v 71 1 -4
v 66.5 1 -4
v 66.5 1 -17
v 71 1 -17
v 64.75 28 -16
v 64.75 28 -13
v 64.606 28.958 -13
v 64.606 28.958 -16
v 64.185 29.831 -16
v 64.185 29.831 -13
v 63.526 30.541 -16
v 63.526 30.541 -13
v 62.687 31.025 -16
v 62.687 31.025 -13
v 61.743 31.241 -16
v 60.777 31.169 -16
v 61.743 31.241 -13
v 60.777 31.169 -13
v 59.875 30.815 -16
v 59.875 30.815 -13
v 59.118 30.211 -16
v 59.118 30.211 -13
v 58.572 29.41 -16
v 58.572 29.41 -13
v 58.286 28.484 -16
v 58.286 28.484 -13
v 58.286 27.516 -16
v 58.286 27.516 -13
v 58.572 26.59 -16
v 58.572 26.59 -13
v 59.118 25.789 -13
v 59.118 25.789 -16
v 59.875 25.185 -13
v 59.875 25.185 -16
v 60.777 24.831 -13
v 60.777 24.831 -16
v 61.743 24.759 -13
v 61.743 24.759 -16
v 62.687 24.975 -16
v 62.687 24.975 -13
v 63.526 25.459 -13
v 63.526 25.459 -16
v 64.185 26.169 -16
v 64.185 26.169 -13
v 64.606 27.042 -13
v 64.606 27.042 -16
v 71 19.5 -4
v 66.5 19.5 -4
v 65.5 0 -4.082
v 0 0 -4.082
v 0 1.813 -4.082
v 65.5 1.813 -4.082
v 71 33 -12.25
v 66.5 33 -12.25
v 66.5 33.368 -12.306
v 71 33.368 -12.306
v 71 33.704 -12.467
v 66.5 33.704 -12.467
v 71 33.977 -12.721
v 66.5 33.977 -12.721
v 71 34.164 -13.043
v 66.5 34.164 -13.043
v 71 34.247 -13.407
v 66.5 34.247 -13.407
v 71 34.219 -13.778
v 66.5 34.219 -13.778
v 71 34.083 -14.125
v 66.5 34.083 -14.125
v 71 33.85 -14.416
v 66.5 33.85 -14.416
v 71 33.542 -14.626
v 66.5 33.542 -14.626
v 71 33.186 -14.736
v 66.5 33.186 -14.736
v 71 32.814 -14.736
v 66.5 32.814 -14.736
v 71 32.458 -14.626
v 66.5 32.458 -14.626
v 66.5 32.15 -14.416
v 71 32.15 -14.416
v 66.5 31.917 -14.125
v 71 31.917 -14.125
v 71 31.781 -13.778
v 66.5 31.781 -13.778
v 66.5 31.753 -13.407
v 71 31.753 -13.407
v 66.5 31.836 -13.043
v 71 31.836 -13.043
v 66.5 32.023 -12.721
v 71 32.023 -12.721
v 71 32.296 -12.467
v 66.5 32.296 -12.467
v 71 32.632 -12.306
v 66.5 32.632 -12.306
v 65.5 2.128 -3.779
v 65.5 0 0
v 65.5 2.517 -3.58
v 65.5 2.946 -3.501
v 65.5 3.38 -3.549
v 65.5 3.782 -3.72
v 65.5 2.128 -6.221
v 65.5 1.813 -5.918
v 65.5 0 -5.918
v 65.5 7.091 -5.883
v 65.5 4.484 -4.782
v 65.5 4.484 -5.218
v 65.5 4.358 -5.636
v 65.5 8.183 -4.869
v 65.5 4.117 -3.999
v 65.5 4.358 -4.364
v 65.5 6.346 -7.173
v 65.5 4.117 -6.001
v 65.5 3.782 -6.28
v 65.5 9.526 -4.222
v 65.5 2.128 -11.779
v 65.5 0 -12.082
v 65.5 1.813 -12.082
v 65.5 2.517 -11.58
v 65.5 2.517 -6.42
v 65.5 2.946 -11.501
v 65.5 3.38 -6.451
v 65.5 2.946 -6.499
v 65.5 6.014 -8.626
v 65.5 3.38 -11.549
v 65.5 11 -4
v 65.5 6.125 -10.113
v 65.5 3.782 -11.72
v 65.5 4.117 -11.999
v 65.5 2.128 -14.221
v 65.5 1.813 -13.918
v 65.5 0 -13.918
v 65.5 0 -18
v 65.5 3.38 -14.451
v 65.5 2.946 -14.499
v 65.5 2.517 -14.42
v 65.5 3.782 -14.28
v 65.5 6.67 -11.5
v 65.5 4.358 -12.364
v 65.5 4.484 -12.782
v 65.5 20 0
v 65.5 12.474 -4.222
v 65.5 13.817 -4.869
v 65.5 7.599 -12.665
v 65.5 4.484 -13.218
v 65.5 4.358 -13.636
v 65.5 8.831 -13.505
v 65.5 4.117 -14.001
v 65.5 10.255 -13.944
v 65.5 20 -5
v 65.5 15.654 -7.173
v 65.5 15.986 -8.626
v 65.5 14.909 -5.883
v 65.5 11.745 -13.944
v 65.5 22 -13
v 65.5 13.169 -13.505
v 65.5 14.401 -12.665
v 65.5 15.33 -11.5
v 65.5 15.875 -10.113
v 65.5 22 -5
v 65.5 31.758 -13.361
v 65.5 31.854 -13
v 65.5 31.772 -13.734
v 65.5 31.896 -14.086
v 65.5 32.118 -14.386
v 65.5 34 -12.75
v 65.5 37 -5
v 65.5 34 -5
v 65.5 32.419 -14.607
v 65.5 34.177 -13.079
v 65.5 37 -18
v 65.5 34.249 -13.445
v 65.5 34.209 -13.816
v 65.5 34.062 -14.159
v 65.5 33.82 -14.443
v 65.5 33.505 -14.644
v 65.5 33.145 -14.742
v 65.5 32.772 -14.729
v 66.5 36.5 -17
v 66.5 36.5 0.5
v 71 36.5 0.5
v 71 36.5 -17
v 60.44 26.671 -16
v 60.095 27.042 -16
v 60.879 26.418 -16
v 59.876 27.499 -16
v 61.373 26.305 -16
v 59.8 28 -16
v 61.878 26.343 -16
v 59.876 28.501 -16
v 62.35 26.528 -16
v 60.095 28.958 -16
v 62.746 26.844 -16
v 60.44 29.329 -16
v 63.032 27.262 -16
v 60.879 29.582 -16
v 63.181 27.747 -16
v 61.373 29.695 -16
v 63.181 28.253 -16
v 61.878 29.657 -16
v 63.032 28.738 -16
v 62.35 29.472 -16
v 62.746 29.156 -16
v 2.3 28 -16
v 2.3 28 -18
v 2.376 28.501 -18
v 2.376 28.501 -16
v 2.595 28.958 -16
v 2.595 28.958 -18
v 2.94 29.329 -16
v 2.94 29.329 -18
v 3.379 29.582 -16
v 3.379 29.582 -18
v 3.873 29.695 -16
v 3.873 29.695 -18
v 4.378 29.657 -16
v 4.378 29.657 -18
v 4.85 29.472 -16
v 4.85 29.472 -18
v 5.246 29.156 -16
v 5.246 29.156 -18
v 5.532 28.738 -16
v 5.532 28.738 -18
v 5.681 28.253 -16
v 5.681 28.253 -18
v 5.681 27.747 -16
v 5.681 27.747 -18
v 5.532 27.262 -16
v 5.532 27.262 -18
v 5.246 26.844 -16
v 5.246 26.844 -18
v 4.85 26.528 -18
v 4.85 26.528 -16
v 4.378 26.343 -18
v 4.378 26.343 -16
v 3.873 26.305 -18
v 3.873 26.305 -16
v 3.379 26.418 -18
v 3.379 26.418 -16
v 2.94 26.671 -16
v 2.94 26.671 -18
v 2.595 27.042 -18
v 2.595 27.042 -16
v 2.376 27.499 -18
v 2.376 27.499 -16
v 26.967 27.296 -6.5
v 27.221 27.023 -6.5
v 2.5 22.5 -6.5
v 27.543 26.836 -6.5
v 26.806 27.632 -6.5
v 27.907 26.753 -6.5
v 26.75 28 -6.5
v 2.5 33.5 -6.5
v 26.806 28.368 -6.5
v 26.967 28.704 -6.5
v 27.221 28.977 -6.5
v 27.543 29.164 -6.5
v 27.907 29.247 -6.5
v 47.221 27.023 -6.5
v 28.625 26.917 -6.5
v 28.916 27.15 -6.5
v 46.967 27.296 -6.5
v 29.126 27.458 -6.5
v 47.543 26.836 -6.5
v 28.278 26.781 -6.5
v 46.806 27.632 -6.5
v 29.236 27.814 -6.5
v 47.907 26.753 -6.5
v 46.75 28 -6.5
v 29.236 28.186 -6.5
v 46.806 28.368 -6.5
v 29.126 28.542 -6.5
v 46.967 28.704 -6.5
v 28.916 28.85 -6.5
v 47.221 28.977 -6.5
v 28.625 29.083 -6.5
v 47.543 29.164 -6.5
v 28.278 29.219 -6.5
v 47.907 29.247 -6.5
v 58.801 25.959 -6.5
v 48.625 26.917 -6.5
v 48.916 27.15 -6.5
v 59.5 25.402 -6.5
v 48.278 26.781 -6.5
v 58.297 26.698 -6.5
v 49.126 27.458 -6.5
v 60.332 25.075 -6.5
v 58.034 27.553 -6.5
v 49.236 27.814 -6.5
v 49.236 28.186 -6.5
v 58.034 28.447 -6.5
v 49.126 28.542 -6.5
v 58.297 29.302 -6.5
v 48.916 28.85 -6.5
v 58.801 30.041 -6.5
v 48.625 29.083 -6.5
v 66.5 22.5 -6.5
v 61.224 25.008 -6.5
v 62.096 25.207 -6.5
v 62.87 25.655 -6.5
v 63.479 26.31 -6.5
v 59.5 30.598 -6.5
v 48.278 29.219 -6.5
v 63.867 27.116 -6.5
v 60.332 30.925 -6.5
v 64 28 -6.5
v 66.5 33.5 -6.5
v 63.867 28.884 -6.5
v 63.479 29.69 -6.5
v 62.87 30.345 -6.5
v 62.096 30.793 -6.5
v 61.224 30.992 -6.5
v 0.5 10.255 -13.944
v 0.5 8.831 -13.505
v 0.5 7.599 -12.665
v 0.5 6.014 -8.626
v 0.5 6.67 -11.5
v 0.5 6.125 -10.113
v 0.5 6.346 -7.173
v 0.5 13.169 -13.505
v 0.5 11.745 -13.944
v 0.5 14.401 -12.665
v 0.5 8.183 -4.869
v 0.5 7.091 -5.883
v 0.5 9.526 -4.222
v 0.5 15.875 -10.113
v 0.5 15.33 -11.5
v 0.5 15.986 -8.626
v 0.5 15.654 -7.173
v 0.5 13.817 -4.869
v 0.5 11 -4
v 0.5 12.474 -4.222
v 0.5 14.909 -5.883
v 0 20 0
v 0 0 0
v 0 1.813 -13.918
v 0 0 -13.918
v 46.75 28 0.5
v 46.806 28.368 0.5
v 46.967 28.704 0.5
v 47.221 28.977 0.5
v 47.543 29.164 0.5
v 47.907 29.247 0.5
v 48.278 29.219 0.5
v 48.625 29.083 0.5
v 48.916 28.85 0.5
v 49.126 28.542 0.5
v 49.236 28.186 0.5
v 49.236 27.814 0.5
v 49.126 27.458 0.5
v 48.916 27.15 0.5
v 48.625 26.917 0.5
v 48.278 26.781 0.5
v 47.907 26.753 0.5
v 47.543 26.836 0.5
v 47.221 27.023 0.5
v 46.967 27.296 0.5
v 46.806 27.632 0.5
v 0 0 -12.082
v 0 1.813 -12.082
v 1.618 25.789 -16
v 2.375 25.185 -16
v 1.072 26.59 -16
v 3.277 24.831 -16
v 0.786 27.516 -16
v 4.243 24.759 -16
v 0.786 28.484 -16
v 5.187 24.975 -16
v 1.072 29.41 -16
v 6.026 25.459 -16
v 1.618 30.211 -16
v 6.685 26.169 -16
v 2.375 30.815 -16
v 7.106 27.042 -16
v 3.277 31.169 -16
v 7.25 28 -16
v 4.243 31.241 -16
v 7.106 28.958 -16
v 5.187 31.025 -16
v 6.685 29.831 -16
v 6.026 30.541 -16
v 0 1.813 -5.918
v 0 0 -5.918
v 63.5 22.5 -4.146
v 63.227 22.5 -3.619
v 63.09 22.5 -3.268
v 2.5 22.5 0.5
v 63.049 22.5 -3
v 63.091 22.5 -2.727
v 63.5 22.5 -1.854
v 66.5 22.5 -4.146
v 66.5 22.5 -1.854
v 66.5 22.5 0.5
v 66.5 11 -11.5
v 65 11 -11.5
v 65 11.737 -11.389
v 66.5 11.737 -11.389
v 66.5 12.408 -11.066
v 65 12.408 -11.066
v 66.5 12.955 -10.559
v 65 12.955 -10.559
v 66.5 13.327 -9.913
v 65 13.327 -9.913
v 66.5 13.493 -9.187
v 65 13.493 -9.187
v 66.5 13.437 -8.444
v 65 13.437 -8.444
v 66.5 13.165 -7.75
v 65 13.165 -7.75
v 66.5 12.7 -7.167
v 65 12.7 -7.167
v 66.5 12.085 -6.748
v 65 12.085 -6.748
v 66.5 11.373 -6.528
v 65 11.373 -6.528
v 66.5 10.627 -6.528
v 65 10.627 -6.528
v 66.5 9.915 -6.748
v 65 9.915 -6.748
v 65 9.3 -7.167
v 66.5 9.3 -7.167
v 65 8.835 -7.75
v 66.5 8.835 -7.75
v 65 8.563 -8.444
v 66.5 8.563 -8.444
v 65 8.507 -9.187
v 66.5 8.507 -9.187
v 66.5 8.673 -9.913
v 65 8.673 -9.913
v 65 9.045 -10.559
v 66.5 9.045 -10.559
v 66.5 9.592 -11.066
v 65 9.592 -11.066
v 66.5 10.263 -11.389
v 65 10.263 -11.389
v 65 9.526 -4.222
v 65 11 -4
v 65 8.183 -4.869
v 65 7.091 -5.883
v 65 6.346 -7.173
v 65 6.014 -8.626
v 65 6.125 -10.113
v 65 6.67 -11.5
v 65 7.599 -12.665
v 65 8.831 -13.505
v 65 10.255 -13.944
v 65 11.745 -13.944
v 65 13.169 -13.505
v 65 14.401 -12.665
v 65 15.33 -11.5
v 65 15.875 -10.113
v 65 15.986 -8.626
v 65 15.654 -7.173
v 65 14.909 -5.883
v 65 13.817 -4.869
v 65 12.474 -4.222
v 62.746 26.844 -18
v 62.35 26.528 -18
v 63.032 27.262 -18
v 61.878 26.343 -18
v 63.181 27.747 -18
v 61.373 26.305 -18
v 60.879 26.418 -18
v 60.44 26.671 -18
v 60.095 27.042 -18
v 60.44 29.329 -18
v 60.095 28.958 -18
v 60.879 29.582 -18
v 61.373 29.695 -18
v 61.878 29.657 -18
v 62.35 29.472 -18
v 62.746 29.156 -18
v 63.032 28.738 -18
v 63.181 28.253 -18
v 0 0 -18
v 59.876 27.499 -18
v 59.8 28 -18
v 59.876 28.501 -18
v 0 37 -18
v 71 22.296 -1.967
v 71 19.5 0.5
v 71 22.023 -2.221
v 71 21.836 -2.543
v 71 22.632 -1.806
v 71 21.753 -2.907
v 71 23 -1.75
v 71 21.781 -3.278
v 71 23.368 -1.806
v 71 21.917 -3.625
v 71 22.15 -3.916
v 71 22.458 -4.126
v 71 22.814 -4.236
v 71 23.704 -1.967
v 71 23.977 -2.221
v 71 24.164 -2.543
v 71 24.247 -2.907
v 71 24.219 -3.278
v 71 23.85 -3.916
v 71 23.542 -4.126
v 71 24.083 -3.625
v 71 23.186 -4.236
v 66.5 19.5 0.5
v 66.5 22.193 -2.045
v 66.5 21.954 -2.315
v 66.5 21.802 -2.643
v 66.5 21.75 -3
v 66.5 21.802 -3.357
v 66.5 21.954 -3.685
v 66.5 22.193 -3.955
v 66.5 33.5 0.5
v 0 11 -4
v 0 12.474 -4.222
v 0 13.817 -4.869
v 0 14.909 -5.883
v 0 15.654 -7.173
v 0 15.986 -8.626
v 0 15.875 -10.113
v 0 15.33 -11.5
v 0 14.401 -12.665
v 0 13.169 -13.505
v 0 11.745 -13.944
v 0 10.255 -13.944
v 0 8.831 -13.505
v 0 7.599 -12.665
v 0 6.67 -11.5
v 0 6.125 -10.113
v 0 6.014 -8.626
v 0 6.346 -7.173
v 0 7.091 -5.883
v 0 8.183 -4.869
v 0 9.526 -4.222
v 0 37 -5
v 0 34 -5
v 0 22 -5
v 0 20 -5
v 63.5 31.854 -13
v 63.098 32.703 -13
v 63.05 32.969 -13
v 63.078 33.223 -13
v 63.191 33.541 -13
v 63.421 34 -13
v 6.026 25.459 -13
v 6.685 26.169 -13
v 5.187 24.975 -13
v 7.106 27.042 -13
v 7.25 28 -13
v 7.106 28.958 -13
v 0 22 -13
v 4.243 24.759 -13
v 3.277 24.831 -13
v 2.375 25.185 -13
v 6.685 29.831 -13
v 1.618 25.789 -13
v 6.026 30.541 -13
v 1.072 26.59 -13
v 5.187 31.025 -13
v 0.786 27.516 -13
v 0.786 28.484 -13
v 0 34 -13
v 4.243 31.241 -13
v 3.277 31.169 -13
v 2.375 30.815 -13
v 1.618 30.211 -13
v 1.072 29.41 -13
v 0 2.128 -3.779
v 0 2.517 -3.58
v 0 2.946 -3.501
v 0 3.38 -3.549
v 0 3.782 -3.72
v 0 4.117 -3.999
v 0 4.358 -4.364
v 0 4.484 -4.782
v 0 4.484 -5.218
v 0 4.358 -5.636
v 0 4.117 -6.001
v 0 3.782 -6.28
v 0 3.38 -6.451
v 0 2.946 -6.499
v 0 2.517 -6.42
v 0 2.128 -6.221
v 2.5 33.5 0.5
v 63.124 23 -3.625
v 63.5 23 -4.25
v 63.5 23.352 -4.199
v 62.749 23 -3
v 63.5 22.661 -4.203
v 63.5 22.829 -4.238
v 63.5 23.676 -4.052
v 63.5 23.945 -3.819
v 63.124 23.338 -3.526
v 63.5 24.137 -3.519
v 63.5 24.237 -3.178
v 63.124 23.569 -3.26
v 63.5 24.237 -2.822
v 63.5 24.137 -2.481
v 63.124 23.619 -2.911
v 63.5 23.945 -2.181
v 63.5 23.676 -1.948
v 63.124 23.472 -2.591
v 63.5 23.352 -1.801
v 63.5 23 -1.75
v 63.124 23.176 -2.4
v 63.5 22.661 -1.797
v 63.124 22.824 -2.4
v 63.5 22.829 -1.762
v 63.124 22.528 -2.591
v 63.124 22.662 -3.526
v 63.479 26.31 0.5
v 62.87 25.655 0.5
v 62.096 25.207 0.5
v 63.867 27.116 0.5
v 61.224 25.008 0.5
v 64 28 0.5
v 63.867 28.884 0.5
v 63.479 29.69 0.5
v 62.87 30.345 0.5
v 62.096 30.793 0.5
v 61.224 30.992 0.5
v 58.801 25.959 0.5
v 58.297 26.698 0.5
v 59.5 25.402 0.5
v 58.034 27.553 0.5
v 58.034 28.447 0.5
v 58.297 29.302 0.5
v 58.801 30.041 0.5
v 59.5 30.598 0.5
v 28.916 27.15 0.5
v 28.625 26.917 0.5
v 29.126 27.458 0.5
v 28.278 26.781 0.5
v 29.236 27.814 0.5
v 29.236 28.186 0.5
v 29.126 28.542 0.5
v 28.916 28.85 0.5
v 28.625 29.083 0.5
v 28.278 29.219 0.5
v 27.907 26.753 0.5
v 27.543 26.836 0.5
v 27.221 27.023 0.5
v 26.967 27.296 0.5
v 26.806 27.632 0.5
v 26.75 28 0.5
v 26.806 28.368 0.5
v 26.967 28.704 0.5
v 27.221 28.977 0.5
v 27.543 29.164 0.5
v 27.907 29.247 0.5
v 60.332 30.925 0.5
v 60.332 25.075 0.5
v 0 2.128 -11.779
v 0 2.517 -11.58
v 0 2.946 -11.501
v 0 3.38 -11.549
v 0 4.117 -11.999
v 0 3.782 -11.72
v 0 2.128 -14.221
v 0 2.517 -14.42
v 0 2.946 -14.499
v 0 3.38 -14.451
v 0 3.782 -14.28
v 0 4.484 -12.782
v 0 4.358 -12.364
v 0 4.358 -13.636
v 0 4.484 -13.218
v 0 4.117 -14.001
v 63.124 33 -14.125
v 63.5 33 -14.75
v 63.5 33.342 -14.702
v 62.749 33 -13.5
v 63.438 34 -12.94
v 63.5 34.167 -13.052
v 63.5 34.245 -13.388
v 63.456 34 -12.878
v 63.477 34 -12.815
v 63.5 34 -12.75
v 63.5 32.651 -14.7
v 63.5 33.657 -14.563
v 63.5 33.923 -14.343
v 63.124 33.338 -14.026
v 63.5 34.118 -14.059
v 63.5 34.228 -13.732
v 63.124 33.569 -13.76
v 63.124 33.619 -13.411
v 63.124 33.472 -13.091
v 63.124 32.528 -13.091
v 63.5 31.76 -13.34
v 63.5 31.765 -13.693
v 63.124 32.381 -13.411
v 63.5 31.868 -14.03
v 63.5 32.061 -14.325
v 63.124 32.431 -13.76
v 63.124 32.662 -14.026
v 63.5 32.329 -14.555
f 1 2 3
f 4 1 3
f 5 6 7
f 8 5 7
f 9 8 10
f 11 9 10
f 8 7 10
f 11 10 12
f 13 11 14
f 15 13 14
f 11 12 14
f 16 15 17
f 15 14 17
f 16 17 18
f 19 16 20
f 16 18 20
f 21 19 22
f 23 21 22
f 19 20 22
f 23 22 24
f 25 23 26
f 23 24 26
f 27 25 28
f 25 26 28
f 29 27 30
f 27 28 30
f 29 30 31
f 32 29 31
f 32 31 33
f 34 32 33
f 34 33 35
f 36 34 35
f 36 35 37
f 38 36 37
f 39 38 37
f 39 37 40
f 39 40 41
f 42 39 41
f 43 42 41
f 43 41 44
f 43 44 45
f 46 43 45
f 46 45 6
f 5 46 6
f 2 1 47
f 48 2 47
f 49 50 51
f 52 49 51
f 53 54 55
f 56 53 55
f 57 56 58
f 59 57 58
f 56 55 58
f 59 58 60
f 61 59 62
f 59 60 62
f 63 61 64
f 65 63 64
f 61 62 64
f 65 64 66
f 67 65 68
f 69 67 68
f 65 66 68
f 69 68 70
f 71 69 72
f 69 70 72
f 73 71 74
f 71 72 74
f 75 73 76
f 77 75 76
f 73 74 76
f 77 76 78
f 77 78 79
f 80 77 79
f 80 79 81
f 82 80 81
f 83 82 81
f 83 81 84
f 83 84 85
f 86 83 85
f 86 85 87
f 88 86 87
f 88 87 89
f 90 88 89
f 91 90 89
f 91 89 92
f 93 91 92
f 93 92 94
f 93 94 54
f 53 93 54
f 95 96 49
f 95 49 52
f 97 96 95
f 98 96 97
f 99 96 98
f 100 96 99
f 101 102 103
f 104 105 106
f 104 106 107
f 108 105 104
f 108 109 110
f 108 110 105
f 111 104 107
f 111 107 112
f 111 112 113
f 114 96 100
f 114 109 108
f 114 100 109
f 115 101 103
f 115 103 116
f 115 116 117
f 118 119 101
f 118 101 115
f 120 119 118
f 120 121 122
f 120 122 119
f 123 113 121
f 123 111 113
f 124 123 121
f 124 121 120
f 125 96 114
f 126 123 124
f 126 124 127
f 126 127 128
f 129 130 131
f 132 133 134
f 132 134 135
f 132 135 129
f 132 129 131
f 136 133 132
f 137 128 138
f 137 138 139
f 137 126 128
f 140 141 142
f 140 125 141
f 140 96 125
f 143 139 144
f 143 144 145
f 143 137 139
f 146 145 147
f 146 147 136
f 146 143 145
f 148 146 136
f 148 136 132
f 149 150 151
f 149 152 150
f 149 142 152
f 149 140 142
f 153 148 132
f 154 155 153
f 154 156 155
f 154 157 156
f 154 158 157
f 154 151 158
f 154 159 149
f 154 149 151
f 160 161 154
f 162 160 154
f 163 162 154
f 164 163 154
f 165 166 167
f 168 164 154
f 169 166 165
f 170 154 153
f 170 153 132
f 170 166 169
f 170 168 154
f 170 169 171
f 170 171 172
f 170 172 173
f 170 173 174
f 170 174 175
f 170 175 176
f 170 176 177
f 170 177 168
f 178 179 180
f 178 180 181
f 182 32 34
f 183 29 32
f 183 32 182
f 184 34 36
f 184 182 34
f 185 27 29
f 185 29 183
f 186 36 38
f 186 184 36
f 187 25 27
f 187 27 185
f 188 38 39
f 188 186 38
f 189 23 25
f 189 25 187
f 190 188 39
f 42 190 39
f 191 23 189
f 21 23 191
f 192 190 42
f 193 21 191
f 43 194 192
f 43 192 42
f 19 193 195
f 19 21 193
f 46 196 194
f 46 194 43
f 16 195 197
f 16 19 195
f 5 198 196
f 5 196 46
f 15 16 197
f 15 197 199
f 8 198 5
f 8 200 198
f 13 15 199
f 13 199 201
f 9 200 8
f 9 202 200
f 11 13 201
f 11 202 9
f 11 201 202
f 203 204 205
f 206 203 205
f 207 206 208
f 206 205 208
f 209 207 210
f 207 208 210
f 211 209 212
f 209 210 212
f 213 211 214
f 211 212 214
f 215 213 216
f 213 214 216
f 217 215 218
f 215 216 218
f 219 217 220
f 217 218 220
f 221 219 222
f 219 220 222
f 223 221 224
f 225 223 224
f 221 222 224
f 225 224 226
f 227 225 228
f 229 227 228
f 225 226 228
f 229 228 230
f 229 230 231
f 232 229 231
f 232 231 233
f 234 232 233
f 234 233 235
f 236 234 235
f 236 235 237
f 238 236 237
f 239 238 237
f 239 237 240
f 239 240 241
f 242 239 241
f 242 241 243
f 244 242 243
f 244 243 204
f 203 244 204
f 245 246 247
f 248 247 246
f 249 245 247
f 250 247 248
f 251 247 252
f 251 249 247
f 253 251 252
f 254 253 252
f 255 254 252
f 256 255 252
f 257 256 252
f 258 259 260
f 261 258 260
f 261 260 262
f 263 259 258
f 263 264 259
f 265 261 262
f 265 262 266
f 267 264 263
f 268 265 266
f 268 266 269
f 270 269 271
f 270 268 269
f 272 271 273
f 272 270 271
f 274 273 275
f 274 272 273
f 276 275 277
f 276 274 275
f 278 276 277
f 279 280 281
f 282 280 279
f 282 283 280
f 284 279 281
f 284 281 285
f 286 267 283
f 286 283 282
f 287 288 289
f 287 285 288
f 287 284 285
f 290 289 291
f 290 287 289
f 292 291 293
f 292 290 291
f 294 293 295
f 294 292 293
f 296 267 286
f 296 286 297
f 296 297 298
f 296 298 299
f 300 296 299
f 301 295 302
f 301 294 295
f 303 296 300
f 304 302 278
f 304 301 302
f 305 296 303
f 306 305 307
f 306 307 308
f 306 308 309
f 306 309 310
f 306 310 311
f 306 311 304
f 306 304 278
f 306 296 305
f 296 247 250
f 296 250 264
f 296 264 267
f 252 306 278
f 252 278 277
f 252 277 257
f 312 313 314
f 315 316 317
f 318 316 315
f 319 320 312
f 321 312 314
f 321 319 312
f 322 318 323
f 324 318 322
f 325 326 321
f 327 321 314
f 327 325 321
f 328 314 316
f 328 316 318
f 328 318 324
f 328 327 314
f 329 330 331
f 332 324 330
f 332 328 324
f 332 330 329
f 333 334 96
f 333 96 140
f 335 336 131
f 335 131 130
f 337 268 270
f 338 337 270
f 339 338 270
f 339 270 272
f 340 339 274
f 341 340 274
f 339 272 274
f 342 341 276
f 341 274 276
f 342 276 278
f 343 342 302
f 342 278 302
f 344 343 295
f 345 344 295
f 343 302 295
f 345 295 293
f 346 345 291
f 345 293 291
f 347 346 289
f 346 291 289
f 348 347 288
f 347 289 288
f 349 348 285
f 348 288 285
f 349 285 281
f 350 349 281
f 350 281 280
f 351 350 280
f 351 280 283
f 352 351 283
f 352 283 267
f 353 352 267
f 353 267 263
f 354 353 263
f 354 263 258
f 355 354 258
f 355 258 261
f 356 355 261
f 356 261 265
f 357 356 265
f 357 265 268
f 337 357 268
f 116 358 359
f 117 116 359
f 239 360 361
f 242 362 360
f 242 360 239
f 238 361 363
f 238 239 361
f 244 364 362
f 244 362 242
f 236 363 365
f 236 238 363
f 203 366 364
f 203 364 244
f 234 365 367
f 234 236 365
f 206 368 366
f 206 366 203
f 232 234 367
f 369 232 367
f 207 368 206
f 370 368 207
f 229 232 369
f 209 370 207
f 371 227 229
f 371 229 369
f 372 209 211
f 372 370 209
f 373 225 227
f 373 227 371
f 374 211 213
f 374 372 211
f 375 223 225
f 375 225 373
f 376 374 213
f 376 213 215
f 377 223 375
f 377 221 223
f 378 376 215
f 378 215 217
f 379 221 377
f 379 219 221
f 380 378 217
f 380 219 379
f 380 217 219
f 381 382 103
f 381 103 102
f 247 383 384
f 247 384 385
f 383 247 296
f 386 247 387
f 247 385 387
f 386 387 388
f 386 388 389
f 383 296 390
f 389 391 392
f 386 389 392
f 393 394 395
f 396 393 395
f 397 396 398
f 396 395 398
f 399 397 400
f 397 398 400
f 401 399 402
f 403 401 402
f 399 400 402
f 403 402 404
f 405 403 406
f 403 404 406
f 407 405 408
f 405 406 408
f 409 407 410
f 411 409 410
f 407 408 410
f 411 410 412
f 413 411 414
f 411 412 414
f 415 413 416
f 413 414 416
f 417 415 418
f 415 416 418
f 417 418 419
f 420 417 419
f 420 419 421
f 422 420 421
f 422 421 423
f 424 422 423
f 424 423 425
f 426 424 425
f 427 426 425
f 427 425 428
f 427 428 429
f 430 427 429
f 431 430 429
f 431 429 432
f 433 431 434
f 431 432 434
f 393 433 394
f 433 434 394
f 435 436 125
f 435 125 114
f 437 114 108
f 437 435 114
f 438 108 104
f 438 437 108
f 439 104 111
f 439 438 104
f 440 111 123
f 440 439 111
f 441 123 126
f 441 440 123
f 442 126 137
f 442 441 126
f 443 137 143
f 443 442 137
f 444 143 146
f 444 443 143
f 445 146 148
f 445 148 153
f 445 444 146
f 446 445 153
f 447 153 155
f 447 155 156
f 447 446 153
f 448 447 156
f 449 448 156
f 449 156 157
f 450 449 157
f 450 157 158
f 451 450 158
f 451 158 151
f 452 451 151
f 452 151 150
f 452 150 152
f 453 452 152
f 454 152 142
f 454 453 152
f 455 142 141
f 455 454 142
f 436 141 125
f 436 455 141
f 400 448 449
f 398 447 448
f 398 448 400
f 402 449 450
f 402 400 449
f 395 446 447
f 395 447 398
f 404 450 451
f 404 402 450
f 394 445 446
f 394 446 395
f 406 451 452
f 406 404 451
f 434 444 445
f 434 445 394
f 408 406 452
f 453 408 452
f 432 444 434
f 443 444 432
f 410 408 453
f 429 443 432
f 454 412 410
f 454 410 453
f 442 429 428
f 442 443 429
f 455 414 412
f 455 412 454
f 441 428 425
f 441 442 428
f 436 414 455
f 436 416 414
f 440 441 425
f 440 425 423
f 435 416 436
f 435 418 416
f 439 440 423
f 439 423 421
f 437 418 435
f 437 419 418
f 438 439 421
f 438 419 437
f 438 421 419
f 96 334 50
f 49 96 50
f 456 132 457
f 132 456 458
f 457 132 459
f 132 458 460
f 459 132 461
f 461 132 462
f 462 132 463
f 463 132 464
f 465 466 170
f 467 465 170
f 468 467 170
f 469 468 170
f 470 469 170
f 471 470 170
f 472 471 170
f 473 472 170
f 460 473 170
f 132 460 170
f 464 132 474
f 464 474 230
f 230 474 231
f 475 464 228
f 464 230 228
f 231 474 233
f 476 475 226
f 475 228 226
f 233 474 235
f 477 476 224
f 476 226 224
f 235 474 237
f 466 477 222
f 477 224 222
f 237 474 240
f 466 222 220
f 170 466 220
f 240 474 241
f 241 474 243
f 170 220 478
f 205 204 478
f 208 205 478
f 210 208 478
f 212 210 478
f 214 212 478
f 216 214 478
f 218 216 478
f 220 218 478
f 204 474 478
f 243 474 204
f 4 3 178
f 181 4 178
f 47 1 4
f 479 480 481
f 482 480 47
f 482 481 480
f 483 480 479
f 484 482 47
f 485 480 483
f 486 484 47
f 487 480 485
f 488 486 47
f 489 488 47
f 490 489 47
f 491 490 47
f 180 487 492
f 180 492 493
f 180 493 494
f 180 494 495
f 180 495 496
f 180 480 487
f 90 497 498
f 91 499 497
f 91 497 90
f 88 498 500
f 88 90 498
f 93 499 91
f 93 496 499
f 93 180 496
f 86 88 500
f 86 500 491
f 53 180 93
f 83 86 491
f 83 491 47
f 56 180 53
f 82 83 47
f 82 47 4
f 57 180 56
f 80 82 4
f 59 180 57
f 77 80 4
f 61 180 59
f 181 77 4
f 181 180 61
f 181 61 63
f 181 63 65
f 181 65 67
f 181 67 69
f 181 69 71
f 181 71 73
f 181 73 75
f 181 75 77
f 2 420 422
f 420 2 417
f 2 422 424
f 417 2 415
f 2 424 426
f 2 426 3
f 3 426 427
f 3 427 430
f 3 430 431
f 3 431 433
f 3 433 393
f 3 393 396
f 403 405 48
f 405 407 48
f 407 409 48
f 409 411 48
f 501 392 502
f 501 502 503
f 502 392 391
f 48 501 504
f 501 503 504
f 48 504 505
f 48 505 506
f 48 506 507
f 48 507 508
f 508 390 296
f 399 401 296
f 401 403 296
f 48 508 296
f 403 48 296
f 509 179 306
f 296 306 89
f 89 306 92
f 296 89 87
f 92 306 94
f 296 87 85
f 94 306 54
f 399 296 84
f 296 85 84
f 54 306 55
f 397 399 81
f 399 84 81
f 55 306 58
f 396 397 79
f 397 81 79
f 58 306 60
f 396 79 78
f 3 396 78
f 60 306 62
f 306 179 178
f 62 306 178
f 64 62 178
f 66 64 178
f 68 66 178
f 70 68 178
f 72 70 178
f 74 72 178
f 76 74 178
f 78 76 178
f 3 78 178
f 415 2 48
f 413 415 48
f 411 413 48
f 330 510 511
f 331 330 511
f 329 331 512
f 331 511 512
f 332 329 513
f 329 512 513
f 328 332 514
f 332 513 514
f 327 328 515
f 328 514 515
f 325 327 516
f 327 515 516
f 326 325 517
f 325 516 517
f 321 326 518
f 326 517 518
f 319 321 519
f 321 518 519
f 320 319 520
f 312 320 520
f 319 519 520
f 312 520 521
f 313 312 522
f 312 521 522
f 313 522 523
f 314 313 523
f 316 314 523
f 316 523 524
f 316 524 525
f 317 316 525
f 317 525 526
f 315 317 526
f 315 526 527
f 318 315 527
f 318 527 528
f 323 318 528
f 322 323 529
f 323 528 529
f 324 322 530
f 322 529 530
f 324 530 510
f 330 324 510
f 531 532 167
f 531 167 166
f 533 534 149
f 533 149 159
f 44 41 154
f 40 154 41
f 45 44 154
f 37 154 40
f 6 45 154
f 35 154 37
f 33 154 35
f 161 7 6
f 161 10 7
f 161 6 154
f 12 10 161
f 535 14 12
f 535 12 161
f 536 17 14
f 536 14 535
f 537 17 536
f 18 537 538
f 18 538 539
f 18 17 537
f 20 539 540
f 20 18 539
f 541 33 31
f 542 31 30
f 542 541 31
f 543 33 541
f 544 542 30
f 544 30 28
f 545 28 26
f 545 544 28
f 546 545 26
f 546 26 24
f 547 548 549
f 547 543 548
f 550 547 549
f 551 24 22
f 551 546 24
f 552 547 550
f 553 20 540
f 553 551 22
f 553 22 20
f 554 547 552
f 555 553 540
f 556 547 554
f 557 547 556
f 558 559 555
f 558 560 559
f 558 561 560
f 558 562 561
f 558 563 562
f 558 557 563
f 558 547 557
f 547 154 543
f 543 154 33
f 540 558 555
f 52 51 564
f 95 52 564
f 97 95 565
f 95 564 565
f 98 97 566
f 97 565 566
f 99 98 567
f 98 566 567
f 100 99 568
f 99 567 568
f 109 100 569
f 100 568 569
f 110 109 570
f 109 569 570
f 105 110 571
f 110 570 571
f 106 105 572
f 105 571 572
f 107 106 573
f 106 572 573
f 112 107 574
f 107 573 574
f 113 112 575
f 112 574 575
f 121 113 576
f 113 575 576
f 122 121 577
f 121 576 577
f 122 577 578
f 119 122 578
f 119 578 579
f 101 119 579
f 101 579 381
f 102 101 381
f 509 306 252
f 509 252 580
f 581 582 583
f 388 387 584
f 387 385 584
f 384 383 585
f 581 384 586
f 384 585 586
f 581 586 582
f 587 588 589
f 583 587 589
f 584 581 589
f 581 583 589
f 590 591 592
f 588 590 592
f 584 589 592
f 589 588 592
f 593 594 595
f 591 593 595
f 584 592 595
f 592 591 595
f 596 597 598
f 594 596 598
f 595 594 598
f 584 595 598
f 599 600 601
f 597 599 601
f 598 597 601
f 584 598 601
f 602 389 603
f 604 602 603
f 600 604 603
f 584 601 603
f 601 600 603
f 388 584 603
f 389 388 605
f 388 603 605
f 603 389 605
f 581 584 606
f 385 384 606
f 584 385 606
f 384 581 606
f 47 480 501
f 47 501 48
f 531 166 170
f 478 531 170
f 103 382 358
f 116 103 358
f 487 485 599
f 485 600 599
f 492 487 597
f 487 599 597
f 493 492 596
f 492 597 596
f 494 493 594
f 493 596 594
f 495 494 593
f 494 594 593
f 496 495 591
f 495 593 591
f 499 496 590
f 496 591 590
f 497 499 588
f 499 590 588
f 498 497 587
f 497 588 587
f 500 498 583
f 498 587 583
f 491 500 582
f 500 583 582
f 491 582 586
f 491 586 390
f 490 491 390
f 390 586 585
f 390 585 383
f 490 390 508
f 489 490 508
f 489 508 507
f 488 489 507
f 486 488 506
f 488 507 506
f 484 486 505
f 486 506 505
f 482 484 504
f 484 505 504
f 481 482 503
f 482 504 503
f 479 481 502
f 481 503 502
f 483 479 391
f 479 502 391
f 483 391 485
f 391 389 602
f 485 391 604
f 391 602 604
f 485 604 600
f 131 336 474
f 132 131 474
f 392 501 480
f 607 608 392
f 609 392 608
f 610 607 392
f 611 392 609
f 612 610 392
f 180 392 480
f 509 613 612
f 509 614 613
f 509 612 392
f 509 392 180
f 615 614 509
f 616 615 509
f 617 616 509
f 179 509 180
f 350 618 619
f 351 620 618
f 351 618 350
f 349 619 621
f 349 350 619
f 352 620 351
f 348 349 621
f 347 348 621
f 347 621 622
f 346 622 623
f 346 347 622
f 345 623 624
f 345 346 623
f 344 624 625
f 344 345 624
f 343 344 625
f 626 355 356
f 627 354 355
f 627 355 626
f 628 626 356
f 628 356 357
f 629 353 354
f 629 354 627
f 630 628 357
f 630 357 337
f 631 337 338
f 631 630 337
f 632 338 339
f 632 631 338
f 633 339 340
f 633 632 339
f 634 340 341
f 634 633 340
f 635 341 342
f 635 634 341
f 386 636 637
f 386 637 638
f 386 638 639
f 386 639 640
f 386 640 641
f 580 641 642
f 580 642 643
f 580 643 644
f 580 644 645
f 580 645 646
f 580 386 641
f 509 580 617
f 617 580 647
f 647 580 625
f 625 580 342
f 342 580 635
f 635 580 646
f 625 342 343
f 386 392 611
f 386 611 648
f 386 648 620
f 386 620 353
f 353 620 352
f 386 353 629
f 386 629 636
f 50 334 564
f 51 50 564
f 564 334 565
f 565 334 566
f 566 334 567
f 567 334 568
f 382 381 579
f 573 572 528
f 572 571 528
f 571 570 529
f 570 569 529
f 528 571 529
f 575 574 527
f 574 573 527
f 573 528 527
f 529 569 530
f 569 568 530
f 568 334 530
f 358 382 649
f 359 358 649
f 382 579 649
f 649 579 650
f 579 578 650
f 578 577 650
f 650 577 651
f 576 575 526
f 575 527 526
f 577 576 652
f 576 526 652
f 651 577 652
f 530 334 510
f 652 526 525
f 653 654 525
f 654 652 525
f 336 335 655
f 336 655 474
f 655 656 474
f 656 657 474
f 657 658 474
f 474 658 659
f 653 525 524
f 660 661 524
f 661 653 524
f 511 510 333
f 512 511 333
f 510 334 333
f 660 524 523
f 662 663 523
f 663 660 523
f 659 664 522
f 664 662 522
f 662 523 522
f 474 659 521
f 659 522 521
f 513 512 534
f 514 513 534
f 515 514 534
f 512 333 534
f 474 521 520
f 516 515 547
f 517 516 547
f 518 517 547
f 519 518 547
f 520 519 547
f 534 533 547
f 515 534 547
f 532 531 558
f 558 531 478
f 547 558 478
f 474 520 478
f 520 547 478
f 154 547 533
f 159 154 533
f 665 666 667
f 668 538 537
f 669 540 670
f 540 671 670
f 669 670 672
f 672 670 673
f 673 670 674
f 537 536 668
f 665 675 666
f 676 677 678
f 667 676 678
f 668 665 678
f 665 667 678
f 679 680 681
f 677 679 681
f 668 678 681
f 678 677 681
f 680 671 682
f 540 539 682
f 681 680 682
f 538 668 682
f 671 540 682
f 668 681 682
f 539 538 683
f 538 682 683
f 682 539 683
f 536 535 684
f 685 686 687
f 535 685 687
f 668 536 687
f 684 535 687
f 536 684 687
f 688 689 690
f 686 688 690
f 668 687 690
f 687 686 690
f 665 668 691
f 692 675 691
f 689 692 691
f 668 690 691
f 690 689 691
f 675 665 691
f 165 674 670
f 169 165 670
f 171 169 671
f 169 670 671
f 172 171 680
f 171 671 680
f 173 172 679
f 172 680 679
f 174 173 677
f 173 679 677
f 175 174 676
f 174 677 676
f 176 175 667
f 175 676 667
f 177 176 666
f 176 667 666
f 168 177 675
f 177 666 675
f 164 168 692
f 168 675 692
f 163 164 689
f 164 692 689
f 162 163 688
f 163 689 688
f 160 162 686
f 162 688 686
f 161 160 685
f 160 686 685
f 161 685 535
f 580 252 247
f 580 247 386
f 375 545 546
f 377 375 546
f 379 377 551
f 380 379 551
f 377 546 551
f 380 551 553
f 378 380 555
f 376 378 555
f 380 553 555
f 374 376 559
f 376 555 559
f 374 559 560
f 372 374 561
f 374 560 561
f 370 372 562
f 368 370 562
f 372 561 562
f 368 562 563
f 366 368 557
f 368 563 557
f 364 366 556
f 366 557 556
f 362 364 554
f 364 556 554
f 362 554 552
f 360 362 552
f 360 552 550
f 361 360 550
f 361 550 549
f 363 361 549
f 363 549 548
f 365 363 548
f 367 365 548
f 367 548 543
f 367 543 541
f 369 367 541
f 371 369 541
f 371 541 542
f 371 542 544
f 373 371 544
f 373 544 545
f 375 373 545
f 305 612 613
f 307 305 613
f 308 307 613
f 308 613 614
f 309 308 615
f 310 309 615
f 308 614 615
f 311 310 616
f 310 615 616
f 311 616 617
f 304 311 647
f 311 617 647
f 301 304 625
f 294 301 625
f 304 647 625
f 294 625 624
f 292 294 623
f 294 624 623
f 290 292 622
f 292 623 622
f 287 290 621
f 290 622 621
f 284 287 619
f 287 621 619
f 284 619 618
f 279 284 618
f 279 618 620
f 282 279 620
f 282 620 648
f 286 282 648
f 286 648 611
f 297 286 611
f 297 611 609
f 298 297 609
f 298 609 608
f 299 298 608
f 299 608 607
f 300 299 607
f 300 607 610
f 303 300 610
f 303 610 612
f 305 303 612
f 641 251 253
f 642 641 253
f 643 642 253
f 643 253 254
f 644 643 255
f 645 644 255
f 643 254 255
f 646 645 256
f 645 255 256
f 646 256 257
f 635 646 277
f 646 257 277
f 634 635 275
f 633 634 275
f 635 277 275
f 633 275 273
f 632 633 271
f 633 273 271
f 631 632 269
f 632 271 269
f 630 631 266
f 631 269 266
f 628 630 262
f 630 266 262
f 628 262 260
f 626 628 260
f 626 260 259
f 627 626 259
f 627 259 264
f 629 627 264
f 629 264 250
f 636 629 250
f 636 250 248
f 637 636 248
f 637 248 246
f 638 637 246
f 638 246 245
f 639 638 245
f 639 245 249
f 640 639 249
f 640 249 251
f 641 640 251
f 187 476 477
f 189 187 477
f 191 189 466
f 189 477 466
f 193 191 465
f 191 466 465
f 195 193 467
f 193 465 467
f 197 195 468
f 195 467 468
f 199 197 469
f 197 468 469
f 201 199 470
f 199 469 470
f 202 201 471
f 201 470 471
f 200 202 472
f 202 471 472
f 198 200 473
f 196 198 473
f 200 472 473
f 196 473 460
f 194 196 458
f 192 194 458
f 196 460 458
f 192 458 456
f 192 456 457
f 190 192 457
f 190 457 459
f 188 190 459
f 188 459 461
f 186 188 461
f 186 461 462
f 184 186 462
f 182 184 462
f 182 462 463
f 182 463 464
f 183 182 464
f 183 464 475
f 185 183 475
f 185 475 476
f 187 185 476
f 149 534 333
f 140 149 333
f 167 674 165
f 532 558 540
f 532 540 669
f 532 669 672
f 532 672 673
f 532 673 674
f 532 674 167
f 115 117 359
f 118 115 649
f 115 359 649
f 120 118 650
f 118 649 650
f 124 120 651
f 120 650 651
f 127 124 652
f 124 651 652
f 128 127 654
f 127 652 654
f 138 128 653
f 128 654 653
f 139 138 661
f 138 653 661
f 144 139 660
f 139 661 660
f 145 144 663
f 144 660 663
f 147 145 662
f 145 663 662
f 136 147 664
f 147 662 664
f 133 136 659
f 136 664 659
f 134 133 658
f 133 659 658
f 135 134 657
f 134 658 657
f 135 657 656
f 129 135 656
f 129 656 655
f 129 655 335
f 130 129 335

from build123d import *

# Parameters (mm, degrees)
SKETCH_1_W                     = 18
SKETCH_1_H                     = 37
EXTRUDE_1_DEPTH                = 65.5
SKETCH_2_R                     = 5
CUT_EXTRUDE_1_DEPTH            = 0.5
CUT_EXTRUDE_START              = -0.5
SKETCH_3_R                     = 5
CUT_EXTRUDE_2_DEPTH            = 0.5
SKETCH_4_R                     = 1.5
CUT_EXTRUDE_3_DEPTH            = 78.351470574
SKETCH_5_W                     = 1.835428096
SKETCH_5_H                     = 2.75652024
CUT_EXTRUDE_4_DEPTH            = 78.351470574
SKETCH_6_W                     = 5
SKETCH_6_H                     = 17
CUT_EXTRUDE_5_DEPTH            = 78.351470574
SKETCH_7_W                     = 8
SKETCH_7_H                     = 12
CUT_EXTRUDE_6_DEPTH            = 78.351470574
SKETCH_8_R                     = 2.5
EXTRUDE_2_DEPTH                = 1.5
SKETCH_9_W                     = 17.5
SKETCH_9_H                     = 35.5
EXTRUDE_3_DEPTH                = 4.5
SKETCH_10_W                    = 7
SKETCH_10_H                    = 11
EXTRUDE_4_DEPTH                = 64
CUT_EXTRUDE_7_REACH            = 84.061
SKETCH_11_W                    = 4.5
SKETCH_11_H                    = 18.5
HOLE_WIZARD_M3_1_D             = 2.5
HOLE_WIZARD_M3_1_DEPTH         = 7.5
HOLE_WIZARD_M3_1_TIP           = 0.751075774
HOLE_WIZARD_M3_1_2_D           = 3.4
HOLE_WIZARD_M3_1_2_DEPTH       = 5
HOLE_WIZARD_M3_1_2_CBORE_D     = 6.5
HOLE_WIZARD_M3_1_2_CBORE_DEPTH = 3
CUT_EXTRUDE_8_REACH            = 84.172
SKETCH_16_R                    = 3
HOLE_WIZARD_M3_2_D             = 2.5
HOLE_WIZARD_M3_2_DEPTH         = 7.5
HOLE_WIZARD_M3_2_TIP           = 0.751075774


with BuildPart() as part:
    # 草图1 → 凸台-拉伸1 (new body)
    with BuildSketch(Plane(origin=(0, 0, 0), x_dir=(0, 0, -1), z_dir=(1, 0, 0))):
        with Locations((9, 18.5)):
            Rectangle(SKETCH_1_W, SKETCH_1_H)
    extrude(amount=EXTRUDE_1_DEPTH)

    # 草图2 → 切除-拉伸1 (cut)
    with BuildSketch(Plane.ZY):
        with Locations((-9, 11)):
            Circle(SKETCH_2_R)
    extrude(amount=-CUT_EXTRUDE_1_DEPTH, mode=Mode.SUBTRACT)

    # 草图3 → 切除-拉伸2 (cut)
    with BuildSketch(Plane(origin=(65.5, 0, 0), x_dir=(0, 0, -1), z_dir=(1, 0, 0)).offset(CUT_EXTRUDE_START)):
        with Locations(Location((9, 11, 0), (0, 0, 180))):
            Circle(SKETCH_3_R)
    extrude(amount=CUT_EXTRUDE_2_DEPTH, mode=Mode.SUBTRACT)

    # 草图4 → 切除-拉伸3 (cut, through all)
    with BuildSketch(Plane.ZY):
        with Locations((-13, 3)):
            Circle(SKETCH_4_R)
        with Locations(Location((-5, 3, 0), (0, 0, 180))):
            Circle(SKETCH_4_R)
    extrude(amount=-CUT_EXTRUDE_3_DEPTH, mode=Mode.SUBTRACT)

    # 草图5 → 切除-拉伸4 (cut, through all)
    with BuildSketch(Plane.ZY):
        with Locations((-13, 1.37826012)):
            Rectangle(SKETCH_5_W, SKETCH_5_H)
        with Locations((-5, 1.37826012)):
            Rectangle(SKETCH_5_W, SKETCH_5_H)
    extrude(amount=-CUT_EXTRUDE_4_DEPTH, mode=Mode.SUBTRACT)

    # 草图6 → 切除-拉伸5 (cut, through all)
    with BuildSketch(Plane.ZY):
        with Locations((-2.5, 28.5)):
            Rectangle(SKETCH_6_W, SKETCH_6_H)
    extrude(amount=-CUT_EXTRUDE_5_DEPTH, mode=Mode.SUBTRACT)

    # 草图7 → 切除-拉伸6 (cut, through all)
    with BuildSketch(Plane.ZY):
        with Locations((-9, 28)):
            Rectangle(SKETCH_7_W, SKETCH_7_H)
    extrude(amount=-CUT_EXTRUDE_6_DEPTH, mode=Mode.SUBTRACT)

    # 草图8 → 凸台-拉伸2 (add)
    with BuildSketch(Plane(origin=(65, 0, 0), x_dir=(0, 0, -1), z_dir=(1, 0, 0))):
        with Locations((9, 11)):
            Circle(SKETCH_8_R)
    extrude(amount=EXTRUDE_2_DEPTH)

    # 草图9 → 凸台-拉伸3 (add)
    with BuildSketch(Plane(origin=(66.5, 0, 0), x_dir=(0, 0, -1), z_dir=(1, 0, 0))):
        with Locations((8.25, 18.75)):
            Rectangle(SKETCH_9_W, SKETCH_9_H)
    extrude(amount=EXTRUDE_3_DEPTH)

    # 草图10 → 凸台-拉伸4 (add)
    with BuildSketch(Plane.ZY.offset(-66.5)):
        with Locations((-3, 28)):
            Rectangle(SKETCH_10_W, SKETCH_10_H)
    extrude(amount=EXTRUDE_4_DEPTH)

    # 草图11 → 切除-拉伸7 (cut, up to next)
    with BuildSketch(Plane(origin=(71, 0, 0), x_dir=(0, 0, -1), z_dir=(1, 0, 0)), mode=Mode.PRIVATE) as cut_extrude_7_sk1:
        with Locations((1.75, 10.25)):
            Rectangle(SKETCH_11_W, SKETCH_11_H)
    cut_extrude_7_tool1 = extrude(cut_extrude_7_sk1.sketch, amount=-CUT_EXTRUDE_7_REACH, mode=Mode.PRIVATE) & part.part
    add(cut_extrude_7_tool1.solids().sort_by_distance((71, 10.25, -1.75))[0], mode=Mode.SUBTRACT)

    # Hole Wizard M3 _1
    with Locations(Plane(origin=(71, 0, 0), x_dir=(0, 0, -1), z_dir=(1, 0, 0))):
        with Locations((13.5, 33), (3, 23)):
            Hole(HOLE_WIZARD_M3_1_D / 2, depth=HOLE_WIZARD_M3_1_DEPTH)
            with Locations((0, 0, -(HOLE_WIZARD_M3_1_DEPTH + HOLE_WIZARD_M3_1_TIP / 2))):  # 118° drill point
                Cone(0, HOLE_WIZARD_M3_1_D / 2, HOLE_WIZARD_M3_1_TIP, mode=Mode.SUBTRACT)

    # Hole Wizard M3 _1 2
    with Locations(Plane.XY.offset(-13)):
        with Locations((4, 28), (61.5, 28)):
            CounterBoreHole(HOLE_WIZARD_M3_1_2_D / 2, HOLE_WIZARD_M3_1_2_CBORE_D / 2, HOLE_WIZARD_M3_1_2_CBORE_DEPTH, depth=HOLE_WIZARD_M3_1_2_DEPTH)

    # 草图16 → 切除-拉伸8 (cut, up to next)
    with BuildSketch(Plane.XY.offset(0.5), mode=Mode.PRIVATE) as cut_extrude_8_sk1:
        with Locations((61, 28)):
            Circle(SKETCH_16_R)
    cut_extrude_8_tool1 = extrude(cut_extrude_8_sk1.sketch, amount=-CUT_EXTRUDE_8_REACH, mode=Mode.PRIVATE) & part.part
    add(cut_extrude_8_tool1.solids().sort_by_distance((61, 28, 0.5))[0], mode=Mode.SUBTRACT)

    # M3 螺纹孔2
    with Locations(Plane.XY.offset(0.5)):
        with Locations((28, 28), (48, 28)):
            Hole(HOLE_WIZARD_M3_2_D / 2, depth=HOLE_WIZARD_M3_2_DEPTH)
            with Locations((0, 0, -(HOLE_WIZARD_M3_2_DEPTH + HOLE_WIZARD_M3_2_TIP / 2))):  # 118° drill point
                Cone(0, HOLE_WIZARD_M3_2_D / 2, HOLE_WIZARD_M3_2_TIP, mode=Mode.SUBTRACT)


solid = part.part
